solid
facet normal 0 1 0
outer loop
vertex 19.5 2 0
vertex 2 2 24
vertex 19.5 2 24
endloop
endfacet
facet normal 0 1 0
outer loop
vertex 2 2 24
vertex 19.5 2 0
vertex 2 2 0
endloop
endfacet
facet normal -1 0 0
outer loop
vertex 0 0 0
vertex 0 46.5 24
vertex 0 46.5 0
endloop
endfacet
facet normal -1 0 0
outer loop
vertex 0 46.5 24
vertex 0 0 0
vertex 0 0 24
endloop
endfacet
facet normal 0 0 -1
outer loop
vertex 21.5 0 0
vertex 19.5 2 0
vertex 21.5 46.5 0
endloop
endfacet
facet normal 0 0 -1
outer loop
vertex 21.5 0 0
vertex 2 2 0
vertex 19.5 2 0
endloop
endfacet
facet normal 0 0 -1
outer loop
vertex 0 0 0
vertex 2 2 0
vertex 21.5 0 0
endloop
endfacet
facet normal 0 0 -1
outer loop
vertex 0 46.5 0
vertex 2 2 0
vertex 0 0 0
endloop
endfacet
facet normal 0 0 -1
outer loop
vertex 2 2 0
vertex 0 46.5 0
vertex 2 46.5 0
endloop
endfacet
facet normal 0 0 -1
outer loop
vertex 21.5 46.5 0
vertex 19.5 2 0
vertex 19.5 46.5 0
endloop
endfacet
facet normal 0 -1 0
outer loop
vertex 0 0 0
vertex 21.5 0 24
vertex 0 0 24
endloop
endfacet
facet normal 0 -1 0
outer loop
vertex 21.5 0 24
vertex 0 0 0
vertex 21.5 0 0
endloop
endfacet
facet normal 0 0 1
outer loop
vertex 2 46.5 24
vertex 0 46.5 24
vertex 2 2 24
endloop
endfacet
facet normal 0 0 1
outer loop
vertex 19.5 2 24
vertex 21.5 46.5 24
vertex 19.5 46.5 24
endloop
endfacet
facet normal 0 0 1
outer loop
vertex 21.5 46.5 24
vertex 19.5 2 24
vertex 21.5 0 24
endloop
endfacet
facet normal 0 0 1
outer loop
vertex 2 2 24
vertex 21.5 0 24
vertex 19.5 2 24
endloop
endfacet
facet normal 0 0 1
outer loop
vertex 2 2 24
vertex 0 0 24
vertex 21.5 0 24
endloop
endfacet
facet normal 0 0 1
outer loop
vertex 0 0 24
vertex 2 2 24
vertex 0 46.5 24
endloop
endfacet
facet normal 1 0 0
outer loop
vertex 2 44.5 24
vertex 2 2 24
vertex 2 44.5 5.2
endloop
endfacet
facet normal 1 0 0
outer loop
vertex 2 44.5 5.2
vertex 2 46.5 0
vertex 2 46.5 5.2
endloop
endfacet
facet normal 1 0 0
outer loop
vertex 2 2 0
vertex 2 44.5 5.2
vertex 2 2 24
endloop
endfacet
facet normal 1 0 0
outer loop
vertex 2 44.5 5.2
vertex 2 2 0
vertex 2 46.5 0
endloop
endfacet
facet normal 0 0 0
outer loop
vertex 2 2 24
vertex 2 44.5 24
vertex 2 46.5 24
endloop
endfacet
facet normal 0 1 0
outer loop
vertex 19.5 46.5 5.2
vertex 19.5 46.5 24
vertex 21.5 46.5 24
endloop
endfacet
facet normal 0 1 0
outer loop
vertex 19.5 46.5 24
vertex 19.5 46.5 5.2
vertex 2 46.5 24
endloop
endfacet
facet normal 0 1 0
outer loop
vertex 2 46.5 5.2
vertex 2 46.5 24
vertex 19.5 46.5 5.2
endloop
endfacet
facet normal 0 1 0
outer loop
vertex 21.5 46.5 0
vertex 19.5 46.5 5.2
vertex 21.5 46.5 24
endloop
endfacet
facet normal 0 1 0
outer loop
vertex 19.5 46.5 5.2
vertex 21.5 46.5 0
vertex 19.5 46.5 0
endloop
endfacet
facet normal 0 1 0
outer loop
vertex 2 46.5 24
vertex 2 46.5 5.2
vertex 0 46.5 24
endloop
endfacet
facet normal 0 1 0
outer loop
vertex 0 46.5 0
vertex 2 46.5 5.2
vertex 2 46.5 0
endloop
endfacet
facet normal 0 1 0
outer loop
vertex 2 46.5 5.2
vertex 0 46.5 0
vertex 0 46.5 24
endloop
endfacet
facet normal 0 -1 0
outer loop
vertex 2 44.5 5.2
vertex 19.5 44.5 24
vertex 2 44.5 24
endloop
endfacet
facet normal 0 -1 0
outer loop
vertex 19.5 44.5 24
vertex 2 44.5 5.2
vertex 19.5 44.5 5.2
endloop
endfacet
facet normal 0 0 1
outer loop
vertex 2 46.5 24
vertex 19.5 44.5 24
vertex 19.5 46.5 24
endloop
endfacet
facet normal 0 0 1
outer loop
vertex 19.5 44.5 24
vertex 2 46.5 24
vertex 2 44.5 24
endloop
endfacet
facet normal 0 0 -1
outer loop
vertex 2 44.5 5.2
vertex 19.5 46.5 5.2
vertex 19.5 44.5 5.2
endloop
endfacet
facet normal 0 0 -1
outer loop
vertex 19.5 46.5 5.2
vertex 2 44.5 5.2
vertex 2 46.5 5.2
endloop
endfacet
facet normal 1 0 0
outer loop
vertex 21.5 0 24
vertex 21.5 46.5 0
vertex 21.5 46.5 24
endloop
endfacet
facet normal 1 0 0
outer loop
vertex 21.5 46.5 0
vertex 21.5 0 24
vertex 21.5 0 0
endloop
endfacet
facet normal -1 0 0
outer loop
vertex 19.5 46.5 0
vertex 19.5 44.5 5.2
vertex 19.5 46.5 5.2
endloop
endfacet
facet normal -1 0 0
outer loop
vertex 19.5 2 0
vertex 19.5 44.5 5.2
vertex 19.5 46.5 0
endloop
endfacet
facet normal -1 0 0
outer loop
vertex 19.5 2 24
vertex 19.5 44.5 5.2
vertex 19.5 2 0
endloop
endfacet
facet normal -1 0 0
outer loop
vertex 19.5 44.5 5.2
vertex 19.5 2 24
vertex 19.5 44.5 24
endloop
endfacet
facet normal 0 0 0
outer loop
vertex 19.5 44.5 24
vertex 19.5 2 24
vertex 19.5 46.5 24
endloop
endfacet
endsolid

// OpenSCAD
// file: ../base/cube_stacker_base.scad
//Includes 
use <../base/cube_base.scad>

//Model information
model_length = 10;
model_depth = 10;
model_height = 10;
model_offset = 0;
box_height = 1;
model_opening = 0;
model_slack = 10;
stacker_height = 100;
stacker_wall_thickness = 10;

/*
translate([model_offset, model_offset, 0]){
	box(model_length, model_depth, model_height, 1);
}
*/

module stacker(model_length, model_depth, model_height, model_opening, stacker_height, stacker_wall_thickness, box_height, model_slack){
	//Calculated
	wall_length_calc = model_length * model_slack;
	model_depth_calc = model_depth * model_slack;
	model_height_calc = model_height * model_slack;

	//Wall 
	wall_length = [wall_length_calc, stacker_wall_thickness, wall_length_calc, stacker_wall_thickness];
	wall_depth = [stacker_wall_thickness, model_depth_calc, stacker_wall_thickness, model_depth_calc];
	wall_height = [stacker_height, stacker_height, stacker_height -model_opening, stacker_height];
	wall_box_height = [box_height, box_height, box_height, box_height];
	wall_offset = [
	[0, 0, 0],
	[0, 0, 0],
	[0, model_depth_calc - stacker_wall_thickness, model_opening],
	[wall_length_calc, 0, 0]
	];

	wall = [
	wall_length,
	wall_depth,
	wall_height,
	wall_box_height,
	wall_offset
	];

	for(segment = [0:3]){
		translate(wall[4][segment]){
			box(wall[0][segment], wall[1][segment], wall[2][segment], wall[3][segment]);
		}
	}
}
stacker(model_length, model_depth, model_height, model_opening, stacker_height, stacker_wall_thickness, box_height, model_slack);
// file: ../base/cube_base.scad
input_length = 10;
input_height = 10;
input_depth = 10;
box_size = 1;

module box(input_length, input_depth, input_height, box_size){
	length = input_length;
	height = input_height - box_size;
	depth = input_depth;

	bottom_back_left =   [0,      0,     0];
	top_back_left =      [0,      0,     height];
	bottom_front_left =  [0,      depth, 0];
	top_front_left =     [0,      depth, height];
	bottom_back_right =  [length, 0,     0];
	top_back_right =     [length, 0,     height];
	bottom_front_right = [length, depth, 0];
	top_front_right =    [length, depth, height];

	box = [bottom_back_left, top_back_left, bottom_front_left, top_front_left, bottom_back_right, top_back_right, bottom_front_right, top_front_right];

	hull(){
		for(position = box){
			translate(position){
				cube(box_size);
			}
		}
	}
}

box(input_length, input_depth, input_height, box_size);
// main file
//Includes 
use <../base/cube_base.scad>
use <../base/cube_stacker_base.scad>

//Model information
model_length = 15;
model_depth = 35;
model_height = 4;
model_offset = 3;
model_opening = model_height * 1.3;
box_height = 1;
model_slack = 1.3;
stacker_height = model_height * 6;
stacker_wall_thickness = 1;

/*
translate([model_offset, model_offset, 0]){
	color("red"){
		box(model_length, model_depth, model_height, 1);
	}
}
*/

stacker(model_length, model_depth, model_height, model_opening, stacker_height, stacker_wall_thickness, box_height, model_slack);
